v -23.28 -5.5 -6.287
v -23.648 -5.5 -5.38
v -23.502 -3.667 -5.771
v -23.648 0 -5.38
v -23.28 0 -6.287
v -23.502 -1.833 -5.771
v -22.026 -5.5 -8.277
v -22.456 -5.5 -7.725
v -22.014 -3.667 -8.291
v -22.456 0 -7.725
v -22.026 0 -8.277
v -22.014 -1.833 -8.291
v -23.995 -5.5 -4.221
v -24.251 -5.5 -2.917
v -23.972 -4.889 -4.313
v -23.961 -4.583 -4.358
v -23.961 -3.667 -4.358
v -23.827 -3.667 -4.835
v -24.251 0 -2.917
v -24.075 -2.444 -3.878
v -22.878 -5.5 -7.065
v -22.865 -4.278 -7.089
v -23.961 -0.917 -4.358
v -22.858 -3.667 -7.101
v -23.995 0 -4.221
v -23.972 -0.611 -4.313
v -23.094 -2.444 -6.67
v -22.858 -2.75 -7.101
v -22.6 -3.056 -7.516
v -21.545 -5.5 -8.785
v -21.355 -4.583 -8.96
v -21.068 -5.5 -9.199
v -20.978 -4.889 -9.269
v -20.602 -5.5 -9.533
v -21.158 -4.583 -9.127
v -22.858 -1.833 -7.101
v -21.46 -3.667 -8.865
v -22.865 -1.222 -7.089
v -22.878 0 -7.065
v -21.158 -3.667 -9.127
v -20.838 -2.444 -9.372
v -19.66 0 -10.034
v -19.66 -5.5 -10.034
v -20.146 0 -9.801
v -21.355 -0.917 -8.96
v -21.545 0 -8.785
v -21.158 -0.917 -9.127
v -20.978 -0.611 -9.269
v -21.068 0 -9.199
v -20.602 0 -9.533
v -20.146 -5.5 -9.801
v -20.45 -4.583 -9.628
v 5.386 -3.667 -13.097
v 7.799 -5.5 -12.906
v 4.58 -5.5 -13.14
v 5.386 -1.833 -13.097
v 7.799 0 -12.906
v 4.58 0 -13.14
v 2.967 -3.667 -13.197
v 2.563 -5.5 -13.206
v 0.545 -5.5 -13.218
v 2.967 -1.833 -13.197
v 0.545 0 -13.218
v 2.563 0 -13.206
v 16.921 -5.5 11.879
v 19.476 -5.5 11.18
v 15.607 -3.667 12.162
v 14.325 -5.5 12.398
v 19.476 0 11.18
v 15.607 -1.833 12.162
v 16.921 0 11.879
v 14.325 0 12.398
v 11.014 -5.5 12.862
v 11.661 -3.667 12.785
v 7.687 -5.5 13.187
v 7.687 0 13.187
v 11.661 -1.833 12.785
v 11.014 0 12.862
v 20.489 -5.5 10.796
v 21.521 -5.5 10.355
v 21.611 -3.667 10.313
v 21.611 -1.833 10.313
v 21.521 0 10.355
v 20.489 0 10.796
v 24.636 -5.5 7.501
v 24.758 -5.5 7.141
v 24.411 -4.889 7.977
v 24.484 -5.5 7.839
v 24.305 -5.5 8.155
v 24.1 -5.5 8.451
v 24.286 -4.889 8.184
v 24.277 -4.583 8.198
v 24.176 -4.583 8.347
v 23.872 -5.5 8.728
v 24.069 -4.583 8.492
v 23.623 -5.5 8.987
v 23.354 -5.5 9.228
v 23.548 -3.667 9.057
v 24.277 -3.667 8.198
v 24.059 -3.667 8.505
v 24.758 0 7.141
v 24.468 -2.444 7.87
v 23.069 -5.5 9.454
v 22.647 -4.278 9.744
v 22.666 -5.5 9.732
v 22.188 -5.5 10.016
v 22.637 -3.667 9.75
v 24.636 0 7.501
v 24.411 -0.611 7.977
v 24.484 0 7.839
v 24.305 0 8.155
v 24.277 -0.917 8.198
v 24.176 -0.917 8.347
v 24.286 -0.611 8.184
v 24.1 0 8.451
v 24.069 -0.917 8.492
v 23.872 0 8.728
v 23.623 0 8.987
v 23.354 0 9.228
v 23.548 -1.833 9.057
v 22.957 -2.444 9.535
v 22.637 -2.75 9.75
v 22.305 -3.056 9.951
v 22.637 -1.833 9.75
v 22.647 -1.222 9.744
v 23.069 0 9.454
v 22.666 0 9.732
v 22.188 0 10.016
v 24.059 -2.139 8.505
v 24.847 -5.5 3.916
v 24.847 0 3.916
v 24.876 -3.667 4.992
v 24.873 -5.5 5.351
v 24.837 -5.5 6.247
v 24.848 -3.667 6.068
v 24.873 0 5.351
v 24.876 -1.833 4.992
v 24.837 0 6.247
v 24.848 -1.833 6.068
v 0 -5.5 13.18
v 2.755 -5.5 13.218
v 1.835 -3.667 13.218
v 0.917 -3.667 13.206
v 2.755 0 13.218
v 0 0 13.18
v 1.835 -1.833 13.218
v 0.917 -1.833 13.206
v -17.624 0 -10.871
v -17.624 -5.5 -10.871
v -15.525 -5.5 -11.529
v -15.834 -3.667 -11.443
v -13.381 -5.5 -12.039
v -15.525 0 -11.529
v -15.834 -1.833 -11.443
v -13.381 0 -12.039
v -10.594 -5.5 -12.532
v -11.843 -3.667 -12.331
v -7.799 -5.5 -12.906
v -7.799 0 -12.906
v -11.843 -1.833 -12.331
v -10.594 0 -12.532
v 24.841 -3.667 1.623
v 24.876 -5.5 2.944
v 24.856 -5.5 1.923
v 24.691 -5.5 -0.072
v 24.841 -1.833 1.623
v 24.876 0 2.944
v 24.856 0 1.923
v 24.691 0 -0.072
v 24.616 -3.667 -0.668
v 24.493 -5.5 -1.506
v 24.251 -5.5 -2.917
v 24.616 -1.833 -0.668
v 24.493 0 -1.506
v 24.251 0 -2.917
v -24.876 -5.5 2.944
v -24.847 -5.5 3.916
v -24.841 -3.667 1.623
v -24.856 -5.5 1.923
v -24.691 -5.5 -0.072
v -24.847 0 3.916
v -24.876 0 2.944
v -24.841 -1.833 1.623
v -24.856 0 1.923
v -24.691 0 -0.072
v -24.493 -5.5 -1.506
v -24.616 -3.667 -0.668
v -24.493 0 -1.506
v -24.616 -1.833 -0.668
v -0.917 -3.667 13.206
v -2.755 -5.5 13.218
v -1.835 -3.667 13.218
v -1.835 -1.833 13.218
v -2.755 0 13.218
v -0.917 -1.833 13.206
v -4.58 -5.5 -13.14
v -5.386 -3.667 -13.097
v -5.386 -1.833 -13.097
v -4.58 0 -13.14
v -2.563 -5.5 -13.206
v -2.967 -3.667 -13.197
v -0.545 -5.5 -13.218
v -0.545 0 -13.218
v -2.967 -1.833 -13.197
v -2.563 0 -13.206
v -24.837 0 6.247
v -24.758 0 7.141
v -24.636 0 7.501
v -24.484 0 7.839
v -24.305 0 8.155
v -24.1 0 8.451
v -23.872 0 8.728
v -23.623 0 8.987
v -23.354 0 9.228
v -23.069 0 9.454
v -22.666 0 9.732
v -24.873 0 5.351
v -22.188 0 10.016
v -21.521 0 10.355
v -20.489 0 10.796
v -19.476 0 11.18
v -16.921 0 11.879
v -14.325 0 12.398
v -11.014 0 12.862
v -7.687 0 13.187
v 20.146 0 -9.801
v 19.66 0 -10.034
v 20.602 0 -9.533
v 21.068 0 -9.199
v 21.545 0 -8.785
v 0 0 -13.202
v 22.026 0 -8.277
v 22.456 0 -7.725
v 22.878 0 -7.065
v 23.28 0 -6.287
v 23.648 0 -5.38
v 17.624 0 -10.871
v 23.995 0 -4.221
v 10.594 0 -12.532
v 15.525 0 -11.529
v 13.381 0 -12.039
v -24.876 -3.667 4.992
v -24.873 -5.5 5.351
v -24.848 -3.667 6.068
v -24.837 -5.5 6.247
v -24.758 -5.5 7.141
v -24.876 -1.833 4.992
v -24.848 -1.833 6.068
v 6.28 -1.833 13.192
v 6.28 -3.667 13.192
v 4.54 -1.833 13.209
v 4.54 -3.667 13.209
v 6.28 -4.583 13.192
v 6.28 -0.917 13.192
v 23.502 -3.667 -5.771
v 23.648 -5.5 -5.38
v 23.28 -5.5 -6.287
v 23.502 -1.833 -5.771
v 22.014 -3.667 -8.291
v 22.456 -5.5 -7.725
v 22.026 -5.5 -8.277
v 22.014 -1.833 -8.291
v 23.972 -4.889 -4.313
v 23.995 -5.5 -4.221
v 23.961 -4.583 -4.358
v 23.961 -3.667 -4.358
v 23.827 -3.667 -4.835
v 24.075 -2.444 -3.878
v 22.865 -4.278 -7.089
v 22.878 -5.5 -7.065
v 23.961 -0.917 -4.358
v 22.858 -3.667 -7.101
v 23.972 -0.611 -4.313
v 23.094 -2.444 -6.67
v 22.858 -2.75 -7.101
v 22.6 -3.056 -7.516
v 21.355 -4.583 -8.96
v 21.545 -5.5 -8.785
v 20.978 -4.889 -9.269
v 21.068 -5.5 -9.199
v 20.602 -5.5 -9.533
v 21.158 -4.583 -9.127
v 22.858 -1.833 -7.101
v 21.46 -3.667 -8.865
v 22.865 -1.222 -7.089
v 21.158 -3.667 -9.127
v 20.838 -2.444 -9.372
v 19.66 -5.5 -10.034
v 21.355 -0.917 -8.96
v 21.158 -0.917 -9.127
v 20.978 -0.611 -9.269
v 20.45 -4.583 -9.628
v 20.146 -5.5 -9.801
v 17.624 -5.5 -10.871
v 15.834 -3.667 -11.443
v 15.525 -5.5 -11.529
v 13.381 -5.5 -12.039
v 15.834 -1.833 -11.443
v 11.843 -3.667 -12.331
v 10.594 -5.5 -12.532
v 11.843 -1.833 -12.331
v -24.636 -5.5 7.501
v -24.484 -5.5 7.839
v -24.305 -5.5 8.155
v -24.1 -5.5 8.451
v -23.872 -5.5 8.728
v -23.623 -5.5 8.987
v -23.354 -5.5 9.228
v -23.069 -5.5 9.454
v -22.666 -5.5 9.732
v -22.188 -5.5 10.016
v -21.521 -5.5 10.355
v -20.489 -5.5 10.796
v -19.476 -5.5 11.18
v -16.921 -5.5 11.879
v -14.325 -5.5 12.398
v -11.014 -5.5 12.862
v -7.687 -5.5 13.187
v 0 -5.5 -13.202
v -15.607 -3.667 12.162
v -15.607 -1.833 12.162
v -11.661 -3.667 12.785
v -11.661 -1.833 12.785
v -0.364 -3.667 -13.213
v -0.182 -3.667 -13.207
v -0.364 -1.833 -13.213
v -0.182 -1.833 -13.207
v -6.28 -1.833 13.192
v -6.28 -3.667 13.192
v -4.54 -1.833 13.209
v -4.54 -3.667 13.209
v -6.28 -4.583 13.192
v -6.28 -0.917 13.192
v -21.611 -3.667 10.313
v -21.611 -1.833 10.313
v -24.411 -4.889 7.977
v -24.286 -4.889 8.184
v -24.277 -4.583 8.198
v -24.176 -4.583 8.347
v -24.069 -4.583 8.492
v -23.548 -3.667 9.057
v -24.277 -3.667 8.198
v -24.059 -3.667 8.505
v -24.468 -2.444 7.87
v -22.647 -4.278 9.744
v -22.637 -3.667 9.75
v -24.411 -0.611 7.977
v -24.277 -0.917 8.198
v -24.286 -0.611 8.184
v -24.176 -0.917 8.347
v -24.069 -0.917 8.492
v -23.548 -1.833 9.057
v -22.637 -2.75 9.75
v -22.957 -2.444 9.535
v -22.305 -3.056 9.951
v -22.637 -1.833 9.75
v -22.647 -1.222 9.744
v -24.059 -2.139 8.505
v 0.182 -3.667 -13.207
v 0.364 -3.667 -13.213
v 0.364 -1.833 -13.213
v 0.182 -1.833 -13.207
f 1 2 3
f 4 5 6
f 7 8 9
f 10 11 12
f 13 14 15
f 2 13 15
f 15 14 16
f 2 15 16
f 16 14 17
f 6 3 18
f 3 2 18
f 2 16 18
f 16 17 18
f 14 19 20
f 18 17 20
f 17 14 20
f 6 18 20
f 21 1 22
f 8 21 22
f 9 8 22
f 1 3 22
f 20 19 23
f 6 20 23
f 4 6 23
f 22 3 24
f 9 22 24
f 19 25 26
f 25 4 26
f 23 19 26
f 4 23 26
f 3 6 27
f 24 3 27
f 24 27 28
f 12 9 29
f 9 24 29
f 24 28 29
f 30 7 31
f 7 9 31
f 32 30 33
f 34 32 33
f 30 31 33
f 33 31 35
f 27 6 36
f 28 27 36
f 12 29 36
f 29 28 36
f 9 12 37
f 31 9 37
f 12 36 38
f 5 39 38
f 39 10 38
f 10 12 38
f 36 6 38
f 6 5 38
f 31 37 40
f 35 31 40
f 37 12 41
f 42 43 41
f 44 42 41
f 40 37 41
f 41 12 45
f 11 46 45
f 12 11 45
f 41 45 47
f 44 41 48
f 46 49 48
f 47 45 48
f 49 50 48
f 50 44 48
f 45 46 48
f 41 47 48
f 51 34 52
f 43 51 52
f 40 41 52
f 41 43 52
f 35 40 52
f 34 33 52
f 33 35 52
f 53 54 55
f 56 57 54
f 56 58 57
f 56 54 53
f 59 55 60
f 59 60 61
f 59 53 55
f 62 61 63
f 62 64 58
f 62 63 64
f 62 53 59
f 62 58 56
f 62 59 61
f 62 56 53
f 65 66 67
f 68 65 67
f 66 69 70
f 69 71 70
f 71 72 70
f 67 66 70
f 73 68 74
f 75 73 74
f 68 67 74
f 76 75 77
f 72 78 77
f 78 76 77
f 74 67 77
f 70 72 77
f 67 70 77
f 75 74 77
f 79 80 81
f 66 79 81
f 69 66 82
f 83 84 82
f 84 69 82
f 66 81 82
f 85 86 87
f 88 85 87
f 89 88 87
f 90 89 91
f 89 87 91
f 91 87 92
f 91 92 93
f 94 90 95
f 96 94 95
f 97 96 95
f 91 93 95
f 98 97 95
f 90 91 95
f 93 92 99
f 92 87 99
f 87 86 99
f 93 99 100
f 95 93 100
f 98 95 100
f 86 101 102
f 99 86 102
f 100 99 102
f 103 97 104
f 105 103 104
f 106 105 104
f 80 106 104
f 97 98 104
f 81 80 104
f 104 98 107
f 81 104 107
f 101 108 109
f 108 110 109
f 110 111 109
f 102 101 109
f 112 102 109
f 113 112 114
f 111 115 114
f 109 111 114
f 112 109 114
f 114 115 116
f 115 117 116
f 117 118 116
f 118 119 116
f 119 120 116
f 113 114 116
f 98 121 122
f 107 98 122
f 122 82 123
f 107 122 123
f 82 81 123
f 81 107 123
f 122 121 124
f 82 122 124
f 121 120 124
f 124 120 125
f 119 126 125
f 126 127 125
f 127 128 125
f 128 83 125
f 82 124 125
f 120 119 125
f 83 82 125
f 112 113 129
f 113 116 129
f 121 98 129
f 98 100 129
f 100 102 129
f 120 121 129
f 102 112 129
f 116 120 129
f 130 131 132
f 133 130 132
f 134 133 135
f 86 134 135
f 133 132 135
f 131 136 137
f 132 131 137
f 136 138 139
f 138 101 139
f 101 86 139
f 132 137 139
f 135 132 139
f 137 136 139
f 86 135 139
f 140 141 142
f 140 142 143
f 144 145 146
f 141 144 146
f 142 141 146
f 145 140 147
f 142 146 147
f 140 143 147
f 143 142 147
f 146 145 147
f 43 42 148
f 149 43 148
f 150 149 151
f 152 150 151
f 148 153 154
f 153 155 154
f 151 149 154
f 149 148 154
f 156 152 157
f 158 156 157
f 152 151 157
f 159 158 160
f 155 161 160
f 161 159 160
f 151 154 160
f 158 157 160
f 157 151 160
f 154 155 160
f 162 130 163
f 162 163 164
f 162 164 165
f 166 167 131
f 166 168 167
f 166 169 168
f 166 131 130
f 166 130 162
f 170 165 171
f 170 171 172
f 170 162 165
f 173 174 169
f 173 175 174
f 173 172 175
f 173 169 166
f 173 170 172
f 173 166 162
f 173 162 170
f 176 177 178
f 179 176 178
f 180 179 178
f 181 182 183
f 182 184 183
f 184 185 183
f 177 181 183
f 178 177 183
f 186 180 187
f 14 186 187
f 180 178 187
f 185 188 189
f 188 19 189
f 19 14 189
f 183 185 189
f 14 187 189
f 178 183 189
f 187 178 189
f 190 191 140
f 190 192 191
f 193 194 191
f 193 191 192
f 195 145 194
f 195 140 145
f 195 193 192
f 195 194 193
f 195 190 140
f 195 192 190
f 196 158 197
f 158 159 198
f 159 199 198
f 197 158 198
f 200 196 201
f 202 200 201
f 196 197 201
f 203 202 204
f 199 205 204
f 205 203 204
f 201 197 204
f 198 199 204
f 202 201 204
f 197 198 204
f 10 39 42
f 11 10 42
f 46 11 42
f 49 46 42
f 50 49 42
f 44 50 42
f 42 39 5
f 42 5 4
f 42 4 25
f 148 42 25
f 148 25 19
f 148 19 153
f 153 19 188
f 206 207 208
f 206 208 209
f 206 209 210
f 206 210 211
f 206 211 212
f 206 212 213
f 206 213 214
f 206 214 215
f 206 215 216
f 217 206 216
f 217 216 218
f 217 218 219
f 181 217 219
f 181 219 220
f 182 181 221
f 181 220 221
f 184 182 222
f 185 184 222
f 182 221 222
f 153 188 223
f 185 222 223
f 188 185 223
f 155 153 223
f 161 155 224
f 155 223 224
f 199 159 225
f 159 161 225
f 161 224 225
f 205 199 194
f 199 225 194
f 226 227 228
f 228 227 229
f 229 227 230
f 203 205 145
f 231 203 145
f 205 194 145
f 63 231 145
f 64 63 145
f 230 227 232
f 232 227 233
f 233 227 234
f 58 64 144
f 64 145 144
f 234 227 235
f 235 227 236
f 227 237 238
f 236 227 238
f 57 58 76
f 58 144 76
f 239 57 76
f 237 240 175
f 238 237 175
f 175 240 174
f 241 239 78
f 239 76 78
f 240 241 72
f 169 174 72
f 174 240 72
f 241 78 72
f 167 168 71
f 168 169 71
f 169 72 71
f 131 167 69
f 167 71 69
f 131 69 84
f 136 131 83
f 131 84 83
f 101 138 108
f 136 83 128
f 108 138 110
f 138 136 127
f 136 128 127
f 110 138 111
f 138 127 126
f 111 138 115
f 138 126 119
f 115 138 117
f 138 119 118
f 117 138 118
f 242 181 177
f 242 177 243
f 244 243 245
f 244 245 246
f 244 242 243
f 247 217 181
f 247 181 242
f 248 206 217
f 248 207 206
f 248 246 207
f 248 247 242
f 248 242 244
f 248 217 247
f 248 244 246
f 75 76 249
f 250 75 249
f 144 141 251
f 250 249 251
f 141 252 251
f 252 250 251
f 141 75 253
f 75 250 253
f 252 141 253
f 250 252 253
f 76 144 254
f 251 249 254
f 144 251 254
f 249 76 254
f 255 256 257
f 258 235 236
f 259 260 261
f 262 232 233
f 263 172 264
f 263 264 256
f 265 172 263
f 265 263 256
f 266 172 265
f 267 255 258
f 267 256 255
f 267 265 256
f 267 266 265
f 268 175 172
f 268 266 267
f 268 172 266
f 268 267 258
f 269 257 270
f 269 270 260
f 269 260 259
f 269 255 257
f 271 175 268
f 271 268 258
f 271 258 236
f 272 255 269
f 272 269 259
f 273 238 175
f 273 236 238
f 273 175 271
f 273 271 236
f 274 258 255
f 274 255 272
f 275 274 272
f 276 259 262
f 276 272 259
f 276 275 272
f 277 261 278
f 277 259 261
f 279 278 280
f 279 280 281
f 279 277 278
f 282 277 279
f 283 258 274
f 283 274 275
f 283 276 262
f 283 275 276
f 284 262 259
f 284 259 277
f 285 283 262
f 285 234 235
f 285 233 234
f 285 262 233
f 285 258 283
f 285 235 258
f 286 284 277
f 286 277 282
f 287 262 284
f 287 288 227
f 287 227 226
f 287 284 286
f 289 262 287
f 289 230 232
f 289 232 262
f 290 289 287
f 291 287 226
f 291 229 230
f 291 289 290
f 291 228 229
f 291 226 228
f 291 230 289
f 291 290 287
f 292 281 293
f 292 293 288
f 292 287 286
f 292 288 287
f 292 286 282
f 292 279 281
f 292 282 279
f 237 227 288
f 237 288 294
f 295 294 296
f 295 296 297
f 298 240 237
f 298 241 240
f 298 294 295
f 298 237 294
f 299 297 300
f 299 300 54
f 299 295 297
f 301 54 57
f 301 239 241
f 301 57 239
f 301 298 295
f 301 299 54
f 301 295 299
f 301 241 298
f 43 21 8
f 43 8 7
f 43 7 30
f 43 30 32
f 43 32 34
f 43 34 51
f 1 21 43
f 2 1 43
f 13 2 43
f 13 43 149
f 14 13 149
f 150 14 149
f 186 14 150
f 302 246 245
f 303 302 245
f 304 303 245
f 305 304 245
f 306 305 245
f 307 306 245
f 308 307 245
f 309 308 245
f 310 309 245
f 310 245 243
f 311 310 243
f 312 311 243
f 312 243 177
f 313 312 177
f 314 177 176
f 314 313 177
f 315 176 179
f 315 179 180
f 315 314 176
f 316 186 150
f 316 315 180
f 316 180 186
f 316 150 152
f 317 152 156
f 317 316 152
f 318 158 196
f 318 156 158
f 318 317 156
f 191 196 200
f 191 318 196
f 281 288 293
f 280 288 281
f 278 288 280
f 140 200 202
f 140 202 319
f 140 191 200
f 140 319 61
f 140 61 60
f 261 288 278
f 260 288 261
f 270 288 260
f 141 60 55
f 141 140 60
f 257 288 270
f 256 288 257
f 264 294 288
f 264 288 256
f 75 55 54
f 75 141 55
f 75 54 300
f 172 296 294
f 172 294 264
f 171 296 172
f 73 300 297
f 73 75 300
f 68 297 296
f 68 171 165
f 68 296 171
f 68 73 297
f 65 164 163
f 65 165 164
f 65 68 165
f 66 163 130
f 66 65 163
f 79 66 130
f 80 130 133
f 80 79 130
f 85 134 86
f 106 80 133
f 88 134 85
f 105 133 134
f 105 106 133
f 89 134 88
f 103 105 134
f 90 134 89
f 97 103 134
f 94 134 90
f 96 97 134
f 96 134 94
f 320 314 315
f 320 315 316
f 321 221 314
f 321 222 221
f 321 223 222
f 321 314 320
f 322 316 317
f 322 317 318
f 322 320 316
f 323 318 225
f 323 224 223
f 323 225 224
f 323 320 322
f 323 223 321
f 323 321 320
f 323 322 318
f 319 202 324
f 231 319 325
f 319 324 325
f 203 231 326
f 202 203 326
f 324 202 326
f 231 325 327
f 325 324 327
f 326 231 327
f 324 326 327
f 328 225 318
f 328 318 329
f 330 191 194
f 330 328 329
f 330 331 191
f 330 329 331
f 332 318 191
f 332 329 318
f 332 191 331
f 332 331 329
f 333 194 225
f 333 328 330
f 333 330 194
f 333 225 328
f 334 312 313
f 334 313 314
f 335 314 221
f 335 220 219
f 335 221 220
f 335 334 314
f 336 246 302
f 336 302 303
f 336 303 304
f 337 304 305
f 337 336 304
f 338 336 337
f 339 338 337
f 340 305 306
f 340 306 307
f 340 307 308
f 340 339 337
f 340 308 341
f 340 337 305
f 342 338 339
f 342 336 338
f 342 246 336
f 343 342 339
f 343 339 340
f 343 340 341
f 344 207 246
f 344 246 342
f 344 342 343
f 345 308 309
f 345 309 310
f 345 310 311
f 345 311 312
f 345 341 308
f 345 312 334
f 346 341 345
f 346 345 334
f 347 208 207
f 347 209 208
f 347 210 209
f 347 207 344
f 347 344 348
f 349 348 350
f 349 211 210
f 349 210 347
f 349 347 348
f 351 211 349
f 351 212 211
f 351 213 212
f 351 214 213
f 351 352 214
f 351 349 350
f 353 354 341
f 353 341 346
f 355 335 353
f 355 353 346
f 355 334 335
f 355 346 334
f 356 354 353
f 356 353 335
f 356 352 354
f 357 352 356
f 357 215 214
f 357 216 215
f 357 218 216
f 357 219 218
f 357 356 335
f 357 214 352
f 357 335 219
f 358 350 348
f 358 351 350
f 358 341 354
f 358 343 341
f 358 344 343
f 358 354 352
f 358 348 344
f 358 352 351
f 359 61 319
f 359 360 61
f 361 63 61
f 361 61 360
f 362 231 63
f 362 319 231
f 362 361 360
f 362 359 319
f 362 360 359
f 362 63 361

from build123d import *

# Parameters (mm, degrees)
F1_DEPTH = 5.5


with BuildPart() as f1:
    # F0 (on Front) → F1 (new body)
    with BuildSketch(Plane.XZ):
        with BuildLine():
            add(Edge.make_bspline(
                [(0.545475, -13.217901), (-5.679566, -13.041343), (-12.04253, -12.536955), (-17.890133, -10.243843)],
                knots=[0, 0, 0, 0, 1, 1, 1, 1], degree=3))
            add(Edge.make_bspline(
                [(7.799464, -12.905961), (5.389812, -13.14695), (2.966463, -13.232379), (0.545475, -13.217901)],
                knots=[0, 0, 0, 0, 1, 1, 1, 1], degree=3))
            add(Edge.make_bspline(
                [(19.659893, -10.034152), (15.953931, -11.773092), (11.831585, -12.417124), (7.799464, -12.905961)],
                knots=[0, 0, 0, 0, 1, 1, 1, 1], degree=3))
            add(Edge.make_bspline(
                [(24.251078, -2.917157), (23.828041, -5.790574), (22.489394, -8.827624), (19.659893, -10.034152)],
                knots=[0, 0, 0, 0, 1, 1, 1, 1], degree=3))
            add(Edge.make_bspline(
                [(23.910789, 8.292081), (25.354344, 4.760817), (24.927912, 0.754724), (24.251078, -2.917157)],
                knots=[0, 0, 0, 0, 1, 1, 1, 1], degree=3))
            add(Edge.make_bspline(
                [(16.162307, 11.349634), (18.859135, 10.754972), (21.866955, 10.319444), (23.910789, 8.292081)],
                knots=[0, 0, 0, 0, 1, 1, 1, 1], degree=3))
            add(Edge.make_bspline(
                [(10.040137, 12.302453), (12.093639, 12.254484), (14.122984, 11.638951), (16.162307, 11.349634)],
                knots=[0, 0, 0, 0, 1, 1, 1, 1], degree=3))
            add(Edge.make_bspline(
                [(5.840921, 12.727369), (7.228458, 12.588891), (8.584784, 12.489569), (10.040137, 12.302453)],
                knots=[0, 0, 0, 0, 1, 1, 1, 1], degree=3))
            add(Edge.make_bspline(
                [(-2.754622, 13.2179), (0.124277, 13.240252), (2.98532, 13.064458), (5.840921, 12.727369)],
                knots=[0, 0, 0, 0, 1, 1, 1, 1], degree=3))
            add(Edge.make_bspline(
                [(-7.687344, 13.186855), (-6.540888, 13.180534), (-4.467626, 13.219534), (-2.754622, 13.2179)],
                knots=[0, 0, 0, 0, 1, 1, 1, 1], degree=3))
            add(Edge.make_bspline(
                [(-19.475533, 11.179714), (-15.660784, 12.389315), (-11.659683, 12.847782), (-7.687344, 13.186855)],
                knots=[0, 0, 0, 0, 1, 1, 1, 1], degree=3))
            add(Edge.make_bspline(
                [(-24.757551, 7.141359), (-24.089533, 9.476703), (-21.532475, 10.416983), (-19.475533, 11.179714)],
                knots=[0, 0, 0, 0, 1, 1, 1, 1], degree=3))
            add(Edge.make_bspline(
                [(-23.277215, -3.579052), (-24.471103, -0.164982), (-25.169127, 3.528212), (-24.757551, 7.141359)],
                knots=[0, 0, 0, 0, 1, 1, 1, 1], degree=3))
            add(Edge.make_bspline(
                [(-17.890133, -10.243843), (-20.652075, -9.037428), (-22.426691, -6.386289), (-23.277215, -3.579052)],
                knots=[0, 0, 0, 0, 1, 1, 1, 1], degree=3))
        make_face()
    extrude(amount=F1_DEPTH)

    # F2: F1 across plane


with BuildPart() as f1_1:
    add(f1.part)
    add(f1.part.mirror(Plane.YZ))


solid = f1_1.part
